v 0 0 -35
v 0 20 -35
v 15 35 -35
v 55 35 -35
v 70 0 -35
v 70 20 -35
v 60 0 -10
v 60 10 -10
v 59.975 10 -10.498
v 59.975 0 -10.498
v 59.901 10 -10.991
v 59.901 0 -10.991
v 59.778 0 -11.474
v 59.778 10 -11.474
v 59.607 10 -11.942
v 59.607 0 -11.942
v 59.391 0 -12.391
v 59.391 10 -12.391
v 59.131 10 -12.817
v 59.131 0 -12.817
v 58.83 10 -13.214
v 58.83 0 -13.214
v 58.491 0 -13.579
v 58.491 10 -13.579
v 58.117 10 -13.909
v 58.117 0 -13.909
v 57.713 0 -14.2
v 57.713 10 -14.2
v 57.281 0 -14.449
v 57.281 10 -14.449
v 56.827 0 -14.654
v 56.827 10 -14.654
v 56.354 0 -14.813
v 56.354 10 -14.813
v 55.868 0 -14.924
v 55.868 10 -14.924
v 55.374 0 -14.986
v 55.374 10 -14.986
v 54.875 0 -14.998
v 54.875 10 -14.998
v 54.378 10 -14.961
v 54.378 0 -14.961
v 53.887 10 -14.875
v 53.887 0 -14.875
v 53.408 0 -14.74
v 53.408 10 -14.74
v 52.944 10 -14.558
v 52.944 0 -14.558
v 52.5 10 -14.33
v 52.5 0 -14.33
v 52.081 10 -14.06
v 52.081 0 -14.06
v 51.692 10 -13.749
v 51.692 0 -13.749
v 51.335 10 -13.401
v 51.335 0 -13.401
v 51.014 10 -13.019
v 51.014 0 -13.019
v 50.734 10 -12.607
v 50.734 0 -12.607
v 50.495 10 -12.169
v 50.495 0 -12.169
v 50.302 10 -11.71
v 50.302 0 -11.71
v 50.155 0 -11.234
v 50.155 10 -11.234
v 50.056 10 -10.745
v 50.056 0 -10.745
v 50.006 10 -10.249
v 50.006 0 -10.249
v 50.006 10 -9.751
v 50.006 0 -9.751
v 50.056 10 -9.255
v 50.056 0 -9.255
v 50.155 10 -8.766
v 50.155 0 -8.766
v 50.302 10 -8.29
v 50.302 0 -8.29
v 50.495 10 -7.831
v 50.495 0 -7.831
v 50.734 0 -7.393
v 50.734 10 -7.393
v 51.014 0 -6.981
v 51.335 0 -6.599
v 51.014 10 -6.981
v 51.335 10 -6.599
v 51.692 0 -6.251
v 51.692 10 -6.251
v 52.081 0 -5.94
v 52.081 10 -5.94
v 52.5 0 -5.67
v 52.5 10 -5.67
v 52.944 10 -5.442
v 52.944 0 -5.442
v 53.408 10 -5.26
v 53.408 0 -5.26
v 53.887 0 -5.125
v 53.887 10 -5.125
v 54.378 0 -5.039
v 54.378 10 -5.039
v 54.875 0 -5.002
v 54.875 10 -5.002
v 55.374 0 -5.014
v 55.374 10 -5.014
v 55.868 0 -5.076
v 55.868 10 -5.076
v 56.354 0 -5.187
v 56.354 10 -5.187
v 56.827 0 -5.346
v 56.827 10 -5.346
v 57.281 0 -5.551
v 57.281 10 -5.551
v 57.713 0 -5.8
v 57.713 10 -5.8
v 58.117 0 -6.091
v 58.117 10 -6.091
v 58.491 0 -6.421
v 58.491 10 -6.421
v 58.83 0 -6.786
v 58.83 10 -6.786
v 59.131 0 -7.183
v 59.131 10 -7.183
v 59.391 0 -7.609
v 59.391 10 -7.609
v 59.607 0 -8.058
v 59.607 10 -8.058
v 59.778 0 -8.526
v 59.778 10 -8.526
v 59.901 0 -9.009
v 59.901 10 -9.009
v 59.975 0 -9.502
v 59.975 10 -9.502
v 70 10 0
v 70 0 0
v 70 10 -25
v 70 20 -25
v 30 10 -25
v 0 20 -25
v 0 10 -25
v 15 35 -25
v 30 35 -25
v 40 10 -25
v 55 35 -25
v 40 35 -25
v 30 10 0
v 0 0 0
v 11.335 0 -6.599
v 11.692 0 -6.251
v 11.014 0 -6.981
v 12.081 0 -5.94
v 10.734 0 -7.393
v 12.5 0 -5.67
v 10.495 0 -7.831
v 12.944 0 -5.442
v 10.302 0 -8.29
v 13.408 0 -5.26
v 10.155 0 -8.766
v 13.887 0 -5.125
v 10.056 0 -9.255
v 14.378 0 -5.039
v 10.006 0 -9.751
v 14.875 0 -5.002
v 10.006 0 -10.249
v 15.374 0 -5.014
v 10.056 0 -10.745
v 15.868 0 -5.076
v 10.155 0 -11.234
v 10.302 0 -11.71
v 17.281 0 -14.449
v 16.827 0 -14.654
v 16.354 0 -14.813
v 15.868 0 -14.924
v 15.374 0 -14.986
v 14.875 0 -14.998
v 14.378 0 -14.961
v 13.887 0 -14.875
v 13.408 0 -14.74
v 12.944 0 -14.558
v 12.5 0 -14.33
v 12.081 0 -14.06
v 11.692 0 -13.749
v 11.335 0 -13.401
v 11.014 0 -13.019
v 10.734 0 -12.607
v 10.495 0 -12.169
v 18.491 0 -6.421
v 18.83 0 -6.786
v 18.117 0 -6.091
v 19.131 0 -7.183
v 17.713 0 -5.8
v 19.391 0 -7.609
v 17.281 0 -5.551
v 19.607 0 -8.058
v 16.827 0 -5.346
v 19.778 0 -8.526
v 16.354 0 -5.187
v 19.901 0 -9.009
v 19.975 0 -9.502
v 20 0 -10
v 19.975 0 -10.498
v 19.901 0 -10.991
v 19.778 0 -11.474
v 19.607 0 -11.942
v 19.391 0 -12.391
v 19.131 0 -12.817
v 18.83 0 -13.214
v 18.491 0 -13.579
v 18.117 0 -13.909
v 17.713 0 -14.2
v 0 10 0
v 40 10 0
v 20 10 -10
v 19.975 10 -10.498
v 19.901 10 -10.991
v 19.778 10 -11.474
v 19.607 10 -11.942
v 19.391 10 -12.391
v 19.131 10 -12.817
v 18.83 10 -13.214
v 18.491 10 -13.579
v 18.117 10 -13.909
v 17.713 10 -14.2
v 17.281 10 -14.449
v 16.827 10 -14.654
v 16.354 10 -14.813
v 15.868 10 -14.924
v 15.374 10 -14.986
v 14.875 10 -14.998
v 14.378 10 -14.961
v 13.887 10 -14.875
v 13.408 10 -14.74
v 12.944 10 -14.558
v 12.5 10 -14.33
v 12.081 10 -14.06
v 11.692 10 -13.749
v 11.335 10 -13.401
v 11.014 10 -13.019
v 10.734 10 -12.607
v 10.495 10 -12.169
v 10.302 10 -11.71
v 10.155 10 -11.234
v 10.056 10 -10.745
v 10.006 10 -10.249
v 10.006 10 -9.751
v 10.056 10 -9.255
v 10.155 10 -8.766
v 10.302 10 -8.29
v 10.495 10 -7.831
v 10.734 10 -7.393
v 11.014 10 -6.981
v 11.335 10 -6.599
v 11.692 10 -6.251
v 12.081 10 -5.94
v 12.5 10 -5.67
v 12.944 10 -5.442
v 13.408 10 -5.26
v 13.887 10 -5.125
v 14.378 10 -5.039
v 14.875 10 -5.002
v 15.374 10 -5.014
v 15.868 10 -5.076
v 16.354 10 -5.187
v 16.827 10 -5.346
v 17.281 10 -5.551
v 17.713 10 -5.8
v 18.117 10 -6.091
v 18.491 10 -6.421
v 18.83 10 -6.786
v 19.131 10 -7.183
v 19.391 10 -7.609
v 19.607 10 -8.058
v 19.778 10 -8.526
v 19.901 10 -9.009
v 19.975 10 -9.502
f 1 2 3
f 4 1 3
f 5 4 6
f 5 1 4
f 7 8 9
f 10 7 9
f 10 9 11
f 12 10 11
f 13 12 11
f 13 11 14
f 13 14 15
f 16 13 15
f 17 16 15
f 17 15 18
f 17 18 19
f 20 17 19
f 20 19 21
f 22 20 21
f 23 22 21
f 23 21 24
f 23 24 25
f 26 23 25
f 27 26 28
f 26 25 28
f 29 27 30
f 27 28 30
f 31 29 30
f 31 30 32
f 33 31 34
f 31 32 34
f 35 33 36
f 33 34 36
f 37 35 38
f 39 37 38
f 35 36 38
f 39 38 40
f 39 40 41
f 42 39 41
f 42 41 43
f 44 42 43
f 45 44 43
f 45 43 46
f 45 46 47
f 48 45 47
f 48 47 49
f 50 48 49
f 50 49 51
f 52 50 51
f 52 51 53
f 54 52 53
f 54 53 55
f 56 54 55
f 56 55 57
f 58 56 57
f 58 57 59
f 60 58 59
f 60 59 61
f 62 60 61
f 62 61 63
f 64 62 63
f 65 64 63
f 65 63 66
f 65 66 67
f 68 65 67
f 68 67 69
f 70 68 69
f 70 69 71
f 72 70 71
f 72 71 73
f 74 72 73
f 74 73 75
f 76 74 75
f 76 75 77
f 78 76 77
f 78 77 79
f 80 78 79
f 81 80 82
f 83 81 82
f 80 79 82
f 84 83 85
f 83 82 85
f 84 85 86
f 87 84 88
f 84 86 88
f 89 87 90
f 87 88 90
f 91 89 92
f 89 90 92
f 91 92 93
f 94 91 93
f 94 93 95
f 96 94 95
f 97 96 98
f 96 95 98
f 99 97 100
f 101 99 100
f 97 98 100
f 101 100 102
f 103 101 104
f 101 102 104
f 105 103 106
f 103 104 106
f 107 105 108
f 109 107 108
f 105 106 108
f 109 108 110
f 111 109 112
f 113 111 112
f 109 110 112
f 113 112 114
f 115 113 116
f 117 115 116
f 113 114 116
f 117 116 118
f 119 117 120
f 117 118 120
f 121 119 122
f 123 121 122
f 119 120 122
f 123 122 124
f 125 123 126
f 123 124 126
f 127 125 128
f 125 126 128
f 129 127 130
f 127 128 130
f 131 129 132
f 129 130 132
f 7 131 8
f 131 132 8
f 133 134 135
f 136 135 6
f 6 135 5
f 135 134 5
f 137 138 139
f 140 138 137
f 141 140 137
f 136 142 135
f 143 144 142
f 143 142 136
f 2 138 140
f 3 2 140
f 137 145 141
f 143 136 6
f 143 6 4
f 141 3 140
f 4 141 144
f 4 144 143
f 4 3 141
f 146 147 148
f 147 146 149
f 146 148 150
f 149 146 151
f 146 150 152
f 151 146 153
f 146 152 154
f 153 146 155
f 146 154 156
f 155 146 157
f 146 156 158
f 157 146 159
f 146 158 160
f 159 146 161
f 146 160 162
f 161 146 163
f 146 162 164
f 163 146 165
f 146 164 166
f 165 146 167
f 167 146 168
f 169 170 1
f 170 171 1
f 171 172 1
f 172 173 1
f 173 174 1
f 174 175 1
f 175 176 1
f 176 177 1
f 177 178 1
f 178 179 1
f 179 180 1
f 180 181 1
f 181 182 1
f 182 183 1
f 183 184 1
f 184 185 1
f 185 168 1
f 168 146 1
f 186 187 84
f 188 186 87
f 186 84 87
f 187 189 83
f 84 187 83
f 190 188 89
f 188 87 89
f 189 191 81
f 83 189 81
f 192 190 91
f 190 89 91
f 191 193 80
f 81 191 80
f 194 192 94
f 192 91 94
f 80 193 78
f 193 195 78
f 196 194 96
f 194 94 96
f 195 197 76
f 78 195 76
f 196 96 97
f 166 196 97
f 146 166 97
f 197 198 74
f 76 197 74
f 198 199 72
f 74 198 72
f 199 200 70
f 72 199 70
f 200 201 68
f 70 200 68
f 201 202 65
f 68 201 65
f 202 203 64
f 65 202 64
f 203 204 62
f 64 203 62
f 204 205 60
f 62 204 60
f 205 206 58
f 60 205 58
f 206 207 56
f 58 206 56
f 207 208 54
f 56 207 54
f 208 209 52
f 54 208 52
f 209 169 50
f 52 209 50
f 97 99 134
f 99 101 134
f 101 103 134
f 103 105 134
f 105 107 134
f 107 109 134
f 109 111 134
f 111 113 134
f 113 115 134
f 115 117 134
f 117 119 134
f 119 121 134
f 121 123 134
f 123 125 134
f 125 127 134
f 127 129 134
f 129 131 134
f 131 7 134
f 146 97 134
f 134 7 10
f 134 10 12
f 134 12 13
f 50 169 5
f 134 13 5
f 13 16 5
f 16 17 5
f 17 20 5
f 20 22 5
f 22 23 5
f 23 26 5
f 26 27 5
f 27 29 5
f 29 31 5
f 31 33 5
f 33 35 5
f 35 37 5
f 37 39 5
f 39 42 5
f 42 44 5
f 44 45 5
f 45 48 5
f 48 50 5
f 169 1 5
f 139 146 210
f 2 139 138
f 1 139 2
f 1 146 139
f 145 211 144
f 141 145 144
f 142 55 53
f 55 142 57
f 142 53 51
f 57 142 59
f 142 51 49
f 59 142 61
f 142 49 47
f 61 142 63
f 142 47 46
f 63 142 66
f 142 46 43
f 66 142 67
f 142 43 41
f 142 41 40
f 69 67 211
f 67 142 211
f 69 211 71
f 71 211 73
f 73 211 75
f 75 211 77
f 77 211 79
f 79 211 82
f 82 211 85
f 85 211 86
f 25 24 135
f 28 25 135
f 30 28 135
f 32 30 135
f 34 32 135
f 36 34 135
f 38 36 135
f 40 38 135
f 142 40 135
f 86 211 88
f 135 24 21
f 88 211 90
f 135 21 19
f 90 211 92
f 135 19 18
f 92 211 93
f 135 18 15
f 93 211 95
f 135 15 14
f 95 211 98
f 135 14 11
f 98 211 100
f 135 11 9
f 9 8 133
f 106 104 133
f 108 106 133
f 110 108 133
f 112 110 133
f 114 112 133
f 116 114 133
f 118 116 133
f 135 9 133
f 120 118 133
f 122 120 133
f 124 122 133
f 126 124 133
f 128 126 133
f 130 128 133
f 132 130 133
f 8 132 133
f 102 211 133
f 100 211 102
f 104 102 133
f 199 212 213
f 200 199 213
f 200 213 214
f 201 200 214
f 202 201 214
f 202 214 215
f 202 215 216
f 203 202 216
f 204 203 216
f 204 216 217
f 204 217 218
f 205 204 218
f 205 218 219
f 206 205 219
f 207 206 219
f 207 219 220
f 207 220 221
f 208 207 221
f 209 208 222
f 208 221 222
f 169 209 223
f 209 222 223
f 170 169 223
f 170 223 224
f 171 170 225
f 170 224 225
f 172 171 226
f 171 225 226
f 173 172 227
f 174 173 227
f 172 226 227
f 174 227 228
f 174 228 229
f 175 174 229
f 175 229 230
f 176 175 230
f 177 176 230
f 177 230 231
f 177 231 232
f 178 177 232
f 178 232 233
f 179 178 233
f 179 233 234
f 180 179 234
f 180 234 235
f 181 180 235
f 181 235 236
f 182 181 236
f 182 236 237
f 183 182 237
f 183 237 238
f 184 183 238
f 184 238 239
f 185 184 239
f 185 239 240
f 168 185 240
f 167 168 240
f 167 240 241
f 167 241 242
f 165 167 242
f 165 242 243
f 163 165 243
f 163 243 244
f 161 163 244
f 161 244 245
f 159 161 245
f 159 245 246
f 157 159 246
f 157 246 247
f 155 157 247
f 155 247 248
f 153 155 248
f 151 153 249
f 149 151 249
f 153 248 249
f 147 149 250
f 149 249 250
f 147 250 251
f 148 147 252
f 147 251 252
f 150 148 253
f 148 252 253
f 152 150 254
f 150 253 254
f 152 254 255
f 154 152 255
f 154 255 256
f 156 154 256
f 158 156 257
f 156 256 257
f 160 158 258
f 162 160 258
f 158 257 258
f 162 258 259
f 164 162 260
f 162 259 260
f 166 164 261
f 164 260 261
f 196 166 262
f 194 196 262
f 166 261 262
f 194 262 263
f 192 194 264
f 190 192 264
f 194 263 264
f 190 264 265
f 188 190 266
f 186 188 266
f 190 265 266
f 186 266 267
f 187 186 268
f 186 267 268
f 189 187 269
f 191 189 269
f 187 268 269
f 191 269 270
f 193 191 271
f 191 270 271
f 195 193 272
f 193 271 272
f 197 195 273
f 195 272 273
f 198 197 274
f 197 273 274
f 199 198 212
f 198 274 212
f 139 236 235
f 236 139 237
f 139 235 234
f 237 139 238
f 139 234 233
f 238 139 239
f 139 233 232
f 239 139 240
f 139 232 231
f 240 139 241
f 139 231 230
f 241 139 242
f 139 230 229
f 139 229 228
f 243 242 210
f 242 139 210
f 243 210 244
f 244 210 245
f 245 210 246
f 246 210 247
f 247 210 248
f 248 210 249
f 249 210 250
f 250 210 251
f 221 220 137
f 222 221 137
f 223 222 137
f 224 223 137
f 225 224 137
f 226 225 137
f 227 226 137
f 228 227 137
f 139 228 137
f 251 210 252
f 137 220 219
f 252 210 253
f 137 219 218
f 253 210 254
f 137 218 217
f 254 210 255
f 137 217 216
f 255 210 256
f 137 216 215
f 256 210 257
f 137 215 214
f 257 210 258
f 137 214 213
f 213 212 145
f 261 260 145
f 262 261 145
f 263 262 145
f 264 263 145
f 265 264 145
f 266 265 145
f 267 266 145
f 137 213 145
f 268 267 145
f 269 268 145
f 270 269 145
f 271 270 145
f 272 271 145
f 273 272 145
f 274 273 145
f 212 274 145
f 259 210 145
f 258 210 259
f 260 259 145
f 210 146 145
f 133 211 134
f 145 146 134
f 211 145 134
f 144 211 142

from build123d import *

# Parameters (mm, degrees)
SKETCH2_W           = 70
SKETCH2_H           = 35
BOSS_EXTRUDE1_DEPTH = 35
SKETCH3_W           = 30
SKETCH3_H           = 25
CUT_EXTRUDE1_DEPTH  = 25
SKETCH4_W           = 30
SKETCH4_H           = 25
CUT_EXTRUDE2_DEPTH  = 25
CUT_EXTRUDE3_DEPTH  = 25
CUT_EXTRUDE4_DEPTH  = 25
CUT_EXTRUDE5_DEPTH  = 25
SKETCH8_R           = 5
CUT_EXTRUDE6_DEPTH  = 11
SKETCH9_R           = 5
CUT_EXTRUDE7_DEPTH  = 11


with BuildPart() as part:
    # Sketch2 → Boss-Extrude1 (new body)
    with BuildSketch(Plane(origin=(0, 0, 0), x_dir=(1, 0, 0), z_dir=(0, 1, 0))):
        with Locations((35, 17.5)):
            Rectangle(SKETCH2_W, SKETCH2_H)
    extrude(amount=BOSS_EXTRUDE1_DEPTH)

    # Sketch3 → Cut-Extrude1 (cut)
    with BuildSketch(Plane.XY):
        with Locations((55, 22.5)):
            Rectangle(SKETCH3_W, SKETCH3_H)
    extrude(amount=-CUT_EXTRUDE1_DEPTH, mode=Mode.SUBTRACT)

    # Sketch4 → Cut-Extrude2 (cut)
    with BuildSketch(Plane.XY):
        with Locations((15, 22.5)):
            Rectangle(SKETCH4_W, SKETCH4_H)
    extrude(amount=-CUT_EXTRUDE2_DEPTH, mode=Mode.SUBTRACT)

    # Sketch5 → Cut-Extrude3 (cut)
    with BuildSketch(Plane(origin=(40, 0, 0), x_dir=(0, 0, -1), z_dir=(1, 0, 0))):
        Polygon((0, 10), (25, 35), (0, 35), align=None)
    extrude(amount=-CUT_EXTRUDE3_DEPTH, mode=Mode.SUBTRACT)

    # Sketch6 → Cut-Extrude4 (cut)
    with BuildSketch(Plane.XY.offset(-25)):
        Polygon((70, 35), (70, 20), (55, 35), align=None)
    extrude(amount=-CUT_EXTRUDE4_DEPTH, mode=Mode.SUBTRACT)

    # Sketch7 → Cut-Extrude5 (cut)
    with BuildSketch(Plane.XY.offset(-25)):
        Polygon((0, 35), (0, 20), (15, 35), align=None)
    extrude(amount=-CUT_EXTRUDE5_DEPTH, mode=Mode.SUBTRACT)

    # Sketch8 → Cut-Extrude6 (cut, through all)
    with BuildSketch(Plane(origin=(0, 10, 0), x_dir=(1, 0, 0), z_dir=(0, 1, 0))):
        with Locations((55, 10)):
            Circle(SKETCH8_R)
    extrude(amount=-CUT_EXTRUDE6_DEPTH, mode=Mode.SUBTRACT)

    # Sketch9 → Cut-Extrude7 (cut, through all)
    with BuildSketch(Plane(origin=(0, 10, 0), x_dir=(1, 0, 0), z_dir=(0, 1, 0))):
        with Locations((15, 10)):
            Circle(SKETCH9_R)
    extrude(amount=-CUT_EXTRUDE7_DEPTH, mode=Mode.SUBTRACT)


solid = part.part
